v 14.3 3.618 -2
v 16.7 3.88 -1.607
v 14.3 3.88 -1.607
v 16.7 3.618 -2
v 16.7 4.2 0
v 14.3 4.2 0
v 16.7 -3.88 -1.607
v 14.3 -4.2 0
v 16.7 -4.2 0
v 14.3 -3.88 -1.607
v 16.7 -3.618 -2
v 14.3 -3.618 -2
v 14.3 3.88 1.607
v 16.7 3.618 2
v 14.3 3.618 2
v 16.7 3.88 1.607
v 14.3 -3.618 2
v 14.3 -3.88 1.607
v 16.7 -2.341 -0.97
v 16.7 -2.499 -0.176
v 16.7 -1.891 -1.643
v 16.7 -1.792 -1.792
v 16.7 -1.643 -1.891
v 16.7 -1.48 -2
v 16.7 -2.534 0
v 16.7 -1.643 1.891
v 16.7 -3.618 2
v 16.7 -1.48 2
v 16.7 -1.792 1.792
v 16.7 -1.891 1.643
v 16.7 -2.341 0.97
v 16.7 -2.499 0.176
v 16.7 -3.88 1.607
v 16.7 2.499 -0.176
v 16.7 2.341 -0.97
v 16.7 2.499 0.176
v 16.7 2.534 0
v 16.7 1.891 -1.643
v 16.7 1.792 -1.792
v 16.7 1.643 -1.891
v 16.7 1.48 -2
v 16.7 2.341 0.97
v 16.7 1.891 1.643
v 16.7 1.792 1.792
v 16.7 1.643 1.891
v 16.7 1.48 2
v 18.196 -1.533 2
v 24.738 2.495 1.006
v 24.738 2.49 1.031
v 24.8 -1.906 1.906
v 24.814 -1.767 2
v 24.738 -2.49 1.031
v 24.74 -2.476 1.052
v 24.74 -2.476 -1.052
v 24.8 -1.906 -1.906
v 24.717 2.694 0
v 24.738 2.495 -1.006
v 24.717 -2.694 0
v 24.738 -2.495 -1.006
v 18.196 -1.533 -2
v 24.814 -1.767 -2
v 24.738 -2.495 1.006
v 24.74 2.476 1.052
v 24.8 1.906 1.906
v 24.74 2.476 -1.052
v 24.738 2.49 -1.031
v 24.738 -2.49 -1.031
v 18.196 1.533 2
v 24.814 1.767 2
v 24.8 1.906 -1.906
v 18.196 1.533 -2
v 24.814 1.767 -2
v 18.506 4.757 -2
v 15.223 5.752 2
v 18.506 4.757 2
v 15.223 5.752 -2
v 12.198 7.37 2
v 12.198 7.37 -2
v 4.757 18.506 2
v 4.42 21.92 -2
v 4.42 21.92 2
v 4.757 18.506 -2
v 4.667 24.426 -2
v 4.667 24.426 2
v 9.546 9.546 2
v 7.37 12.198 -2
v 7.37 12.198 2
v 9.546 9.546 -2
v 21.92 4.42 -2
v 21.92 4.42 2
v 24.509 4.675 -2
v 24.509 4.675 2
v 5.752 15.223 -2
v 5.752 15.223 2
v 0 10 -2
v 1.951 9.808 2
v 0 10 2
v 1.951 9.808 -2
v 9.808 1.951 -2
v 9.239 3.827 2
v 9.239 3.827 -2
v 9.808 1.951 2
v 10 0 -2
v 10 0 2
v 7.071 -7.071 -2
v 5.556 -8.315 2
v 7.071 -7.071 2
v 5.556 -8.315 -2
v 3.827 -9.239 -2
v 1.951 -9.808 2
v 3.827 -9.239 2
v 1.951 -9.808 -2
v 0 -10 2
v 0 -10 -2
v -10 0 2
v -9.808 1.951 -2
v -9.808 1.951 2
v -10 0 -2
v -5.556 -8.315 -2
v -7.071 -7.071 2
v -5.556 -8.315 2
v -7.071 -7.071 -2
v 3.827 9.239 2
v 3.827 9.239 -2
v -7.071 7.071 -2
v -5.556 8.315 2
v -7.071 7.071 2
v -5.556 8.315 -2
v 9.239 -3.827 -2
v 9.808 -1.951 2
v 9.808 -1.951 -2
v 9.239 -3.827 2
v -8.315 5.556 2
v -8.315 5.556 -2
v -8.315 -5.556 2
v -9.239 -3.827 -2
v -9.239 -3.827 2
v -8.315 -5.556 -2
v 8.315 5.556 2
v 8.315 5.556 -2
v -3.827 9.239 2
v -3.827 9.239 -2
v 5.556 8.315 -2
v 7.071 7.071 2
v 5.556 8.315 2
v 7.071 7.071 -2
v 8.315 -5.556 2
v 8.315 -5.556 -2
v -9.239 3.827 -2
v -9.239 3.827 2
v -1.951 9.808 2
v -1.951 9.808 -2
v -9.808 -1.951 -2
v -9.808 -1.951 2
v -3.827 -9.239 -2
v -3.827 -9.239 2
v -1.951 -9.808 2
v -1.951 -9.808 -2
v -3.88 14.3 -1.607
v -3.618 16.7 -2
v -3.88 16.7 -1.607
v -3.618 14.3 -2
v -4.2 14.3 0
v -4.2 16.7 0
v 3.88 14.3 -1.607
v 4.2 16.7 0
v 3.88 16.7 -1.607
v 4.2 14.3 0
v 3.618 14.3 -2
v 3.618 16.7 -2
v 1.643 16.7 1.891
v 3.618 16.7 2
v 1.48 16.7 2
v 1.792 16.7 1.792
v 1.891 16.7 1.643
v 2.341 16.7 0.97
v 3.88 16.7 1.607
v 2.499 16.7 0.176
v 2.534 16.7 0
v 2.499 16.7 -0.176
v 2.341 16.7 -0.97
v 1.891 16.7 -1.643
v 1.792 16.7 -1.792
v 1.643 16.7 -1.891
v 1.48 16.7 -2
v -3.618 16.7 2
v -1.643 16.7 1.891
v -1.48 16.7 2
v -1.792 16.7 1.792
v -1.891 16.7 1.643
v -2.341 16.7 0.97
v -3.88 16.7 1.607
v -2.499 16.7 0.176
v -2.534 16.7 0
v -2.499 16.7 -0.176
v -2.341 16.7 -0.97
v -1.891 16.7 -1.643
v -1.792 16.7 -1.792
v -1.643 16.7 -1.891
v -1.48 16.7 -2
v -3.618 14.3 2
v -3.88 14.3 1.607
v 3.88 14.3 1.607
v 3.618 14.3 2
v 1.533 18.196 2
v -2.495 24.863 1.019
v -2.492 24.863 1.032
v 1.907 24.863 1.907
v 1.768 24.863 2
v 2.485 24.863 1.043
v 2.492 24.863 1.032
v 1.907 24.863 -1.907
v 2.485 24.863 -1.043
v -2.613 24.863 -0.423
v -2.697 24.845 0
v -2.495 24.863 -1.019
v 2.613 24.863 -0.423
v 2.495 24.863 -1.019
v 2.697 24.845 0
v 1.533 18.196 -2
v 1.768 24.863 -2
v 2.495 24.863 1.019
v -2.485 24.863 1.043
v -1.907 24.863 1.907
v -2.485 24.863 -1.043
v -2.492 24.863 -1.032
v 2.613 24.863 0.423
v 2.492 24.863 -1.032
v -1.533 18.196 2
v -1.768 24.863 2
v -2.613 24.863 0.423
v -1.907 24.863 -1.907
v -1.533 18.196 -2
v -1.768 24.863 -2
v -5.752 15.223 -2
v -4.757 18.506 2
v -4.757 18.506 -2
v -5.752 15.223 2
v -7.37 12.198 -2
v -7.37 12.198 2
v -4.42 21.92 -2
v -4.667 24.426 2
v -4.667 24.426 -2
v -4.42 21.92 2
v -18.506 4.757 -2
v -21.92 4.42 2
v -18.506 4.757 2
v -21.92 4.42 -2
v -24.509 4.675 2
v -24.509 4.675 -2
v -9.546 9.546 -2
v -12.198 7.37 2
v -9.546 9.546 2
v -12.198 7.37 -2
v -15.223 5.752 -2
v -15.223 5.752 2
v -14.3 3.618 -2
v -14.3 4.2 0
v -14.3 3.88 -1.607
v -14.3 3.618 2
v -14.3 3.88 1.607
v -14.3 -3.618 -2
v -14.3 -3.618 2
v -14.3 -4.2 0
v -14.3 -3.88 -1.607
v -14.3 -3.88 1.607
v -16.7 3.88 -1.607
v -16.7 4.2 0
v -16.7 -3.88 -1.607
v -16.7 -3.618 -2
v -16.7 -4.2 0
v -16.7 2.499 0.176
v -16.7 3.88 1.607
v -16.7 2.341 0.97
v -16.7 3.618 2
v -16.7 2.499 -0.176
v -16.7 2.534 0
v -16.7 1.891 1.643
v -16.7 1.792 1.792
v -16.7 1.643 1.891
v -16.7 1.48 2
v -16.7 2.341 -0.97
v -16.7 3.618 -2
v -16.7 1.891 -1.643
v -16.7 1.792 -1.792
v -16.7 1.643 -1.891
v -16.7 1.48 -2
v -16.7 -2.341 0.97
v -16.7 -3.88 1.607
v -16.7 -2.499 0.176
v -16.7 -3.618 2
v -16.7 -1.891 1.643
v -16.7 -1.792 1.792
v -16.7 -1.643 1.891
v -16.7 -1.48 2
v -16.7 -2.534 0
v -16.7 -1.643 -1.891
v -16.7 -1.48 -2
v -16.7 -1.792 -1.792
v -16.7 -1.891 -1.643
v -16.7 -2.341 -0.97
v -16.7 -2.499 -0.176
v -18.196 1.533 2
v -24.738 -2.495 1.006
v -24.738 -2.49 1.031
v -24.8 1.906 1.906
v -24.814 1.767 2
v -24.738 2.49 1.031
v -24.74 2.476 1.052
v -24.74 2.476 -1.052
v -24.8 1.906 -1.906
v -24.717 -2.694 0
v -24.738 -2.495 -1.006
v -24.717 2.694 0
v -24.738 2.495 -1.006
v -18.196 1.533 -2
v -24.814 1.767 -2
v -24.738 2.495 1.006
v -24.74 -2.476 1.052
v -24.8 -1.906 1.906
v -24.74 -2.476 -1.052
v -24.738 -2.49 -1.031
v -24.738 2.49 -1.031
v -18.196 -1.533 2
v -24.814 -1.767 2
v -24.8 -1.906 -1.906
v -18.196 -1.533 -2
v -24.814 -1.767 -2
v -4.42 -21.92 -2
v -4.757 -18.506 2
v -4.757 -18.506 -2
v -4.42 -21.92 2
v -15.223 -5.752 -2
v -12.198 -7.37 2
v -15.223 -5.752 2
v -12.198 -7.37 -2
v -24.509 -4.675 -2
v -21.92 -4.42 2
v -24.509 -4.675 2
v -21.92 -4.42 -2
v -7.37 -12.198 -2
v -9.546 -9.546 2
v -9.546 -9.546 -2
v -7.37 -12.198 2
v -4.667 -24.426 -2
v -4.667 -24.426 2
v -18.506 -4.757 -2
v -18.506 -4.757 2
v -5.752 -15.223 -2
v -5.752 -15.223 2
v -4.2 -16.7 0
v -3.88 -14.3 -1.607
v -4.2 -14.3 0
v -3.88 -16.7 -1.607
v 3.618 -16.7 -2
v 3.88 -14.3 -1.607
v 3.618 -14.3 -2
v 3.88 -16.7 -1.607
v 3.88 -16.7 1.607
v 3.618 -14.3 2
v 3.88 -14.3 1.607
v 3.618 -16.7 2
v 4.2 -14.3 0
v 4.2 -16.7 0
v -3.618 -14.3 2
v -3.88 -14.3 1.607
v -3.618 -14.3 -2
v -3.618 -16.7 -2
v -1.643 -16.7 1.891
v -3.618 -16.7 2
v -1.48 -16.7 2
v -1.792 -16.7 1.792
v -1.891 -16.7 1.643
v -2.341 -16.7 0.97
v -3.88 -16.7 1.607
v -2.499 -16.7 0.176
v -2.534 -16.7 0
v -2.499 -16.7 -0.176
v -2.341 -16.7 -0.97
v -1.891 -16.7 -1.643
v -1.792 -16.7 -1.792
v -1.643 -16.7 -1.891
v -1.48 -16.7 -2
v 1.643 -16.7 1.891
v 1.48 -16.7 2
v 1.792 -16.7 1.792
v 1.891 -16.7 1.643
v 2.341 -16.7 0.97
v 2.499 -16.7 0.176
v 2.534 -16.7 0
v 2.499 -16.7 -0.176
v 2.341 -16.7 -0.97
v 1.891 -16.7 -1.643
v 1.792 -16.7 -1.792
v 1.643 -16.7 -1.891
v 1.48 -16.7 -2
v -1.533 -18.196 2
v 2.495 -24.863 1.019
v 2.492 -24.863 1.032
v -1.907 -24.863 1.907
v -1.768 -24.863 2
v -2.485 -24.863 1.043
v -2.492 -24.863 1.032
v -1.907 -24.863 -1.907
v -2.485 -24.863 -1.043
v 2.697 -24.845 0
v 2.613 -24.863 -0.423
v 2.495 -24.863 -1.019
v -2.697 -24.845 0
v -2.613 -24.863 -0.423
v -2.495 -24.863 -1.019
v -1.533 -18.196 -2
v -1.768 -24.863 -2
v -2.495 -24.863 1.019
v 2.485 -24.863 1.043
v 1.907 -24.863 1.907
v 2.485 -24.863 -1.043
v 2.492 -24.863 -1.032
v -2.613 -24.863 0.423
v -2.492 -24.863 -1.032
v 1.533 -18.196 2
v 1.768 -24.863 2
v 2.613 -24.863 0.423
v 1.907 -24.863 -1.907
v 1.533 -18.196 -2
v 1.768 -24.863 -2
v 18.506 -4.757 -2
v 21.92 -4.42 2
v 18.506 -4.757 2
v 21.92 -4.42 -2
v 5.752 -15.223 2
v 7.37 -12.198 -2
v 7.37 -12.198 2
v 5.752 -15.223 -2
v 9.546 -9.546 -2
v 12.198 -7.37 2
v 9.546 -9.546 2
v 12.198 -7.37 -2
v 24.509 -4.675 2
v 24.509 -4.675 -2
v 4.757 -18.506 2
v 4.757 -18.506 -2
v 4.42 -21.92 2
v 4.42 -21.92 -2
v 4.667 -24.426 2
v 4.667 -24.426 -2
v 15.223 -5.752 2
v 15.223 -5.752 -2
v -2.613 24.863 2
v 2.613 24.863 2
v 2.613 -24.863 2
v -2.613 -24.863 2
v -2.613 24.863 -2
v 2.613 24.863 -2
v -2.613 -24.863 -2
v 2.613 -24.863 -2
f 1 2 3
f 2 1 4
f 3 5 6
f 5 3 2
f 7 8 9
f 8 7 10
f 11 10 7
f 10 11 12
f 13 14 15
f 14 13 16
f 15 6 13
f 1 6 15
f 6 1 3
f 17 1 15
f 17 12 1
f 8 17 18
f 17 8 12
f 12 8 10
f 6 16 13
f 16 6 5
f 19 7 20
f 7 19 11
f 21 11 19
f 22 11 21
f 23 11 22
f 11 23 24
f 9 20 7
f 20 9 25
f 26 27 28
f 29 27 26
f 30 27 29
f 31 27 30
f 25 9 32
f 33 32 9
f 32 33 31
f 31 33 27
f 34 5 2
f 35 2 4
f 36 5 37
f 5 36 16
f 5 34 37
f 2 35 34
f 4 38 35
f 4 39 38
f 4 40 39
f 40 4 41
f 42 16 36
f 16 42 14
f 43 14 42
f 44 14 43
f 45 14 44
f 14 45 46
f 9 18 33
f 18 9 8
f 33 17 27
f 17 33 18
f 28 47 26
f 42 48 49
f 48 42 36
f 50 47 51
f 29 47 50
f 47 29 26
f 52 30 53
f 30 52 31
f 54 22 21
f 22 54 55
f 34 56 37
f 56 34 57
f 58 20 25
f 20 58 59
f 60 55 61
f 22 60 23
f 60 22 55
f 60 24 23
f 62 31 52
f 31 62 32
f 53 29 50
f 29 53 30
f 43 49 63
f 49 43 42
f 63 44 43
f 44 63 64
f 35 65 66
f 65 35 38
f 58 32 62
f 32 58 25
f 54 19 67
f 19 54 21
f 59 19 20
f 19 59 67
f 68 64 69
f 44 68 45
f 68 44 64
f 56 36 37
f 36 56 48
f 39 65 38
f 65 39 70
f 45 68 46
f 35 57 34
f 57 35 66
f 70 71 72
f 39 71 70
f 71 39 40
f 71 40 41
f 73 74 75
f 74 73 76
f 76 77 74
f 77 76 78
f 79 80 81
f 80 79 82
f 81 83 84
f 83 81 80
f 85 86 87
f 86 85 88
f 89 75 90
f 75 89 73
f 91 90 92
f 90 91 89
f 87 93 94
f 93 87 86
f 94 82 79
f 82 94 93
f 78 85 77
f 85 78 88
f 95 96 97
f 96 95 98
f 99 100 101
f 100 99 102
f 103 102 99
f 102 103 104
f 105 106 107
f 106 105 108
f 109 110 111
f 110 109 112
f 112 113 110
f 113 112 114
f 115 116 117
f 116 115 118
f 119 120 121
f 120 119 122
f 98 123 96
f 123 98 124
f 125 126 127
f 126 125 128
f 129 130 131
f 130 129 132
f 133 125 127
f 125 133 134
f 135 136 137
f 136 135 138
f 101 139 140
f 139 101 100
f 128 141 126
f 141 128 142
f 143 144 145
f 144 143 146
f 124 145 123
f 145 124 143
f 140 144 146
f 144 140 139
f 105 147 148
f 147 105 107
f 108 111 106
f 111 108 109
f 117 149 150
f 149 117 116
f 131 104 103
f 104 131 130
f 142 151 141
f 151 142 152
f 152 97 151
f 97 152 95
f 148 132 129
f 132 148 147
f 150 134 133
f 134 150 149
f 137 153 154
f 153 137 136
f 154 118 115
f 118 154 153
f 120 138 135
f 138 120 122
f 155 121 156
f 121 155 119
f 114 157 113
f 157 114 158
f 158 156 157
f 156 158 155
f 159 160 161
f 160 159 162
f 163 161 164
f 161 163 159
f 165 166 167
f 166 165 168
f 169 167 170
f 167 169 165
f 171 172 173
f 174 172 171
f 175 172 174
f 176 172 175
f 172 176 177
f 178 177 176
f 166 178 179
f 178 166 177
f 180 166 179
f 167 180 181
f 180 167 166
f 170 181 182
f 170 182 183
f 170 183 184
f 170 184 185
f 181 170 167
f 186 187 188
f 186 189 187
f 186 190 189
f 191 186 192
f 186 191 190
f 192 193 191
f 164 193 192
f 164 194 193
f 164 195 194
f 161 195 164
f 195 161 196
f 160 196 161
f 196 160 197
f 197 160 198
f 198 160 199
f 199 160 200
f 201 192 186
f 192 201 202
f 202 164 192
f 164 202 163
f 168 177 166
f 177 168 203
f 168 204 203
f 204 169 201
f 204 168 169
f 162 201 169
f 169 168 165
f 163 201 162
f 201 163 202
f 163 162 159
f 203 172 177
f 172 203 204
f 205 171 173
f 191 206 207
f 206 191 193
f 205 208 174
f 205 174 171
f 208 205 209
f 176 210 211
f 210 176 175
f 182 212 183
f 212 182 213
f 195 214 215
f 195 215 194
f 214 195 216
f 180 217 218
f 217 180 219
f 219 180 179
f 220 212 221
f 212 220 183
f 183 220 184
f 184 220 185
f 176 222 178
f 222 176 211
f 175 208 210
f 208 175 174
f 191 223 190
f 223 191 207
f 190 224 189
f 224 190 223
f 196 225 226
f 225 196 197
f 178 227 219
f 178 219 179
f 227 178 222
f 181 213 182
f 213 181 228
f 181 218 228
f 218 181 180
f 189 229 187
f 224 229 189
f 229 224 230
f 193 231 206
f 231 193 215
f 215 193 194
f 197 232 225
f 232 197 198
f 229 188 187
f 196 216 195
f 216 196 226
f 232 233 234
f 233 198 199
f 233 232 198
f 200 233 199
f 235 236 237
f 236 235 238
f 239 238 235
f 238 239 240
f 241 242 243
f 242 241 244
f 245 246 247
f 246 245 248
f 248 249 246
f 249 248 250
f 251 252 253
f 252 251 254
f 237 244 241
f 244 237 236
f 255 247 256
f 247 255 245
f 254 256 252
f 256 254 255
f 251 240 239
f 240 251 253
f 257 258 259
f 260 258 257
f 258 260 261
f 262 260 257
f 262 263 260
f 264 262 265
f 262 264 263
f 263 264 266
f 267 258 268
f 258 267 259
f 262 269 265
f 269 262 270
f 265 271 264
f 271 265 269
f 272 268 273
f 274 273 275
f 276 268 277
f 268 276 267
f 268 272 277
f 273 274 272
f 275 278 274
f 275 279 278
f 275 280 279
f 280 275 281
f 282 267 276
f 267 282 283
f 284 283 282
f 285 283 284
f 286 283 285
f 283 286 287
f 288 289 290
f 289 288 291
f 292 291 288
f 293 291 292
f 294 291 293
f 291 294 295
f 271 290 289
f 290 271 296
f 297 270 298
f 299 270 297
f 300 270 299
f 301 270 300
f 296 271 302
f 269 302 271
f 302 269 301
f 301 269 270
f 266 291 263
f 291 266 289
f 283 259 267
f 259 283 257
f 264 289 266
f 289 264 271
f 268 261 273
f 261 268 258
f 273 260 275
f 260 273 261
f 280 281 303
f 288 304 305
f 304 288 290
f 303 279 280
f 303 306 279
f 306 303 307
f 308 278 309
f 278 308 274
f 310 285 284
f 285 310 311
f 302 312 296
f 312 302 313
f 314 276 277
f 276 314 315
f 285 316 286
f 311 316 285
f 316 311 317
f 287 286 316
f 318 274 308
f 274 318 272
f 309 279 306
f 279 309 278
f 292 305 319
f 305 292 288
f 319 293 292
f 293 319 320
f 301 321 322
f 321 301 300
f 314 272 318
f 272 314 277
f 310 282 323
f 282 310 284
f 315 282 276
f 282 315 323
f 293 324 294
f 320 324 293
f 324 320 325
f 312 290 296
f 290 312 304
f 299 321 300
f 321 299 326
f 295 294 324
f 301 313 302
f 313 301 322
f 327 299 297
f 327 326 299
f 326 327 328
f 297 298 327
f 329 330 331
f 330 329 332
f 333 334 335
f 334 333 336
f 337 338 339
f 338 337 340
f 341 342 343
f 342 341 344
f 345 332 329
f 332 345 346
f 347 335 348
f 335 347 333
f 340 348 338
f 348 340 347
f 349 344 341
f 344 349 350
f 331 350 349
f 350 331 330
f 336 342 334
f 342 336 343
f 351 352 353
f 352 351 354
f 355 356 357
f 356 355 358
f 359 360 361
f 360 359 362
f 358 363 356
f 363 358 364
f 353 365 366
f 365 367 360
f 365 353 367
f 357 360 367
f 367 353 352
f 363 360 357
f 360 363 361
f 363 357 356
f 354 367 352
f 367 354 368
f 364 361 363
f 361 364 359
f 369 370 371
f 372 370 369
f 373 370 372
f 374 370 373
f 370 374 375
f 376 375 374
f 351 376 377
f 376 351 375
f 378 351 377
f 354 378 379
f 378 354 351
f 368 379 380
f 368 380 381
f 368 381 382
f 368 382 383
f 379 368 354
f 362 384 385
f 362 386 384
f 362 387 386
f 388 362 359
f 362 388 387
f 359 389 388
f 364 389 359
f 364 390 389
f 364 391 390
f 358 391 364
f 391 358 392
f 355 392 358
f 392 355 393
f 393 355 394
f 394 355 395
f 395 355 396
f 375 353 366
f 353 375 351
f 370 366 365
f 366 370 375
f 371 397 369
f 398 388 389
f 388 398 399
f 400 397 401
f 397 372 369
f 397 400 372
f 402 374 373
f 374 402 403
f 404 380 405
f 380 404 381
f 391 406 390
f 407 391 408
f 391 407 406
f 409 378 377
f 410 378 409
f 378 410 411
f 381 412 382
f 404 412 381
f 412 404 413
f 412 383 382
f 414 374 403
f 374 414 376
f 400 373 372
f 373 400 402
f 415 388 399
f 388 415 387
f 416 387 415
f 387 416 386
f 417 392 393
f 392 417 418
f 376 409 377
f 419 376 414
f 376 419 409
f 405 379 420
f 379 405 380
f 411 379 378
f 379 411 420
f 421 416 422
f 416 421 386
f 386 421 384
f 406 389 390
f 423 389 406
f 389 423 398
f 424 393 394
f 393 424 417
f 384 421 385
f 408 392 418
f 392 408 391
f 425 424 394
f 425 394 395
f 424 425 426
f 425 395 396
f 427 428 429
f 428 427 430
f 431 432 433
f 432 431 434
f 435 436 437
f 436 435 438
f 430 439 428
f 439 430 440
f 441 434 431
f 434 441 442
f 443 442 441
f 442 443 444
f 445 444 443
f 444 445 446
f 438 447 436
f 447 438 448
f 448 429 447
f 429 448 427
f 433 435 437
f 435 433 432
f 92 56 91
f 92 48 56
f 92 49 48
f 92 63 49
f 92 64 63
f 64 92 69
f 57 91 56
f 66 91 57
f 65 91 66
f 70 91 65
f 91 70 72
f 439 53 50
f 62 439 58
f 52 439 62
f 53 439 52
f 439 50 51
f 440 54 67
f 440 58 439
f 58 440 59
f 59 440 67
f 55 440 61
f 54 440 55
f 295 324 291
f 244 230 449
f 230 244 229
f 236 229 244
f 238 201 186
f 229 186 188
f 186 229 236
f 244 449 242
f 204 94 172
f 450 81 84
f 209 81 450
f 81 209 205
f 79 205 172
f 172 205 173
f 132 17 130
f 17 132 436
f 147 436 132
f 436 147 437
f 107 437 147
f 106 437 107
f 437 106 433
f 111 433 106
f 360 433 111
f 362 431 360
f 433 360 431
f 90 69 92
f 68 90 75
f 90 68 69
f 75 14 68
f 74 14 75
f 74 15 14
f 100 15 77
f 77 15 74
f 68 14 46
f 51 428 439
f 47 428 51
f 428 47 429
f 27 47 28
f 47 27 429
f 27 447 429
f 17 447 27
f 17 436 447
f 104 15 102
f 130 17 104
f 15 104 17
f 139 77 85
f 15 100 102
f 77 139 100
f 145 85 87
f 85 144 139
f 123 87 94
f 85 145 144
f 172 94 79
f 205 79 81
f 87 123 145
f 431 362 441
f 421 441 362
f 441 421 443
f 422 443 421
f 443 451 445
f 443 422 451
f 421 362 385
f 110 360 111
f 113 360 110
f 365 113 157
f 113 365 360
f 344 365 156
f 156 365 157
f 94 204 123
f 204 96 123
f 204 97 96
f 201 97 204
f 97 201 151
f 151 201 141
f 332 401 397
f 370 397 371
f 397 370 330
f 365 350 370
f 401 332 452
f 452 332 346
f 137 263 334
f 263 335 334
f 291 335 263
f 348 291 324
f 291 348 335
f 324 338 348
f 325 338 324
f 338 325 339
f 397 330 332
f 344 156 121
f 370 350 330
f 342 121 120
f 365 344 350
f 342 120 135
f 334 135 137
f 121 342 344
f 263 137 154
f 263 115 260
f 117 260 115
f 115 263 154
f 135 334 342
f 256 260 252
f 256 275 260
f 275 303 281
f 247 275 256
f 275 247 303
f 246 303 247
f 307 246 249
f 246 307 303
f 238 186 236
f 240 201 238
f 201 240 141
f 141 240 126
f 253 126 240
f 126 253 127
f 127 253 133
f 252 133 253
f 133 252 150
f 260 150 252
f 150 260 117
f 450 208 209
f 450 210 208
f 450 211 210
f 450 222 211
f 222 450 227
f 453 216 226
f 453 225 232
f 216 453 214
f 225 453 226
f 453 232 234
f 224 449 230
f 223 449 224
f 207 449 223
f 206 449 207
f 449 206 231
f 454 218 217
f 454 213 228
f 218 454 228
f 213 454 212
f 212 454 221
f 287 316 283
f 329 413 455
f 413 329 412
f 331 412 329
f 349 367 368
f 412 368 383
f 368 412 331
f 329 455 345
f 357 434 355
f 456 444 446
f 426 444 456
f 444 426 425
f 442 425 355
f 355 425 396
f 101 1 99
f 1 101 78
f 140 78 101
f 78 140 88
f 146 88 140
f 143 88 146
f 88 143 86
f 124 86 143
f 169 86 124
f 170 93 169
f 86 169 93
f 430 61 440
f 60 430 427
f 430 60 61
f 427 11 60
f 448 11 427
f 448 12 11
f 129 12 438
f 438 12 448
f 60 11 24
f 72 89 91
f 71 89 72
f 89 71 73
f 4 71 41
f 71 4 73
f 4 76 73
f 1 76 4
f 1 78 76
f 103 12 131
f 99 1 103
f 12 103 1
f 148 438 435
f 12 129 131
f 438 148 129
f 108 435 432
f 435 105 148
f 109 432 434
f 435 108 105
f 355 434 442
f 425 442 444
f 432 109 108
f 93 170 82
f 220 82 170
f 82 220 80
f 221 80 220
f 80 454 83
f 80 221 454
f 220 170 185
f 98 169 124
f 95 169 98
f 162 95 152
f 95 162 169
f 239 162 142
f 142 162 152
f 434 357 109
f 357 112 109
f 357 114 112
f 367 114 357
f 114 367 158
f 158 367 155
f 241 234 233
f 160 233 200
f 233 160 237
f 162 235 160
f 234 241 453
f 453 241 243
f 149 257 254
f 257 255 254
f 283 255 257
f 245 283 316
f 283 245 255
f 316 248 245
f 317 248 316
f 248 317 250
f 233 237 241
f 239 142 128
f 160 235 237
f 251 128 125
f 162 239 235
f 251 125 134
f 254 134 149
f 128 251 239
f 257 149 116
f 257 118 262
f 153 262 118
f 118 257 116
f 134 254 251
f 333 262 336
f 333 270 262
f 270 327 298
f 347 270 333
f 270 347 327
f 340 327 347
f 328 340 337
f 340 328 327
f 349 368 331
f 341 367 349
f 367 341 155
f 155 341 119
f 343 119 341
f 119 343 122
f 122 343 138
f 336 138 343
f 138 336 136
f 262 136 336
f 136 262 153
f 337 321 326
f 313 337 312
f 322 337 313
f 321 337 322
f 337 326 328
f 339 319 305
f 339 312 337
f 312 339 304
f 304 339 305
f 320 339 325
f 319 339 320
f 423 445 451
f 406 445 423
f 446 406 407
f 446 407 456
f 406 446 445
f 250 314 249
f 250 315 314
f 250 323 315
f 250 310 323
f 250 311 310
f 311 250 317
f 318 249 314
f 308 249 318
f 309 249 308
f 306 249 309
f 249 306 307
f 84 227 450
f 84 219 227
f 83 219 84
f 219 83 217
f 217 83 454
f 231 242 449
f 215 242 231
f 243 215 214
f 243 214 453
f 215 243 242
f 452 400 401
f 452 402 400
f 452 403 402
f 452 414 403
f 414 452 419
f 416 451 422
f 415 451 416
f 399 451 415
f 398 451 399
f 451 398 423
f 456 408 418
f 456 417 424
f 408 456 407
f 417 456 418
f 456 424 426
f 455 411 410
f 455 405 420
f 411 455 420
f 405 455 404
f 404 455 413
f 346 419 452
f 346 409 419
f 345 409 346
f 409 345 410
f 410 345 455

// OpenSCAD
//thickness of the shuriken (4mm works well)
shuriken_w = 4;
//Number of points
shuriken_points = 4;
//Shuriken diameter (without pins)
shuriken_dia = 50;
//Diameter of the middle hole
middle_hole_dia = 20;
tolerance = 0.2;
module shuriken()
{
    difference()
    {
        cylinder(r=shuriken_dia/2, h= shuriken_w, center=true);
        for(x=[0:shuriken_points -1])
        {
           
            rotate([0,90,360/shuriken_points*x])
             translate([0,0,shuriken_dia/2 - 9.5])
            cylinder(r=4+tolerance, h=2+tolerance*2, center=true, $fn=16);
            rotate([0,90,360/shuriken_points*x])
             translate([0,0,shuriken_dia/2 -5])
            cylinder(r1= 2.3+tolerance, r2=2.5+tolerance, h=10, center=true, $fn=16);
            rotate([0,0,360/shuriken_points * (x + 0.5)])
             translate([shuriken_dia*0.62,0,0])
            cylinder(r=shuriken_dia/shuriken_points + 5, h=10, center=true,$fn= 32);
            cylinder(r=middle_hole_dia/2,h=10,center=true,$fn= 32);
        }
    }
}
shuriken();
